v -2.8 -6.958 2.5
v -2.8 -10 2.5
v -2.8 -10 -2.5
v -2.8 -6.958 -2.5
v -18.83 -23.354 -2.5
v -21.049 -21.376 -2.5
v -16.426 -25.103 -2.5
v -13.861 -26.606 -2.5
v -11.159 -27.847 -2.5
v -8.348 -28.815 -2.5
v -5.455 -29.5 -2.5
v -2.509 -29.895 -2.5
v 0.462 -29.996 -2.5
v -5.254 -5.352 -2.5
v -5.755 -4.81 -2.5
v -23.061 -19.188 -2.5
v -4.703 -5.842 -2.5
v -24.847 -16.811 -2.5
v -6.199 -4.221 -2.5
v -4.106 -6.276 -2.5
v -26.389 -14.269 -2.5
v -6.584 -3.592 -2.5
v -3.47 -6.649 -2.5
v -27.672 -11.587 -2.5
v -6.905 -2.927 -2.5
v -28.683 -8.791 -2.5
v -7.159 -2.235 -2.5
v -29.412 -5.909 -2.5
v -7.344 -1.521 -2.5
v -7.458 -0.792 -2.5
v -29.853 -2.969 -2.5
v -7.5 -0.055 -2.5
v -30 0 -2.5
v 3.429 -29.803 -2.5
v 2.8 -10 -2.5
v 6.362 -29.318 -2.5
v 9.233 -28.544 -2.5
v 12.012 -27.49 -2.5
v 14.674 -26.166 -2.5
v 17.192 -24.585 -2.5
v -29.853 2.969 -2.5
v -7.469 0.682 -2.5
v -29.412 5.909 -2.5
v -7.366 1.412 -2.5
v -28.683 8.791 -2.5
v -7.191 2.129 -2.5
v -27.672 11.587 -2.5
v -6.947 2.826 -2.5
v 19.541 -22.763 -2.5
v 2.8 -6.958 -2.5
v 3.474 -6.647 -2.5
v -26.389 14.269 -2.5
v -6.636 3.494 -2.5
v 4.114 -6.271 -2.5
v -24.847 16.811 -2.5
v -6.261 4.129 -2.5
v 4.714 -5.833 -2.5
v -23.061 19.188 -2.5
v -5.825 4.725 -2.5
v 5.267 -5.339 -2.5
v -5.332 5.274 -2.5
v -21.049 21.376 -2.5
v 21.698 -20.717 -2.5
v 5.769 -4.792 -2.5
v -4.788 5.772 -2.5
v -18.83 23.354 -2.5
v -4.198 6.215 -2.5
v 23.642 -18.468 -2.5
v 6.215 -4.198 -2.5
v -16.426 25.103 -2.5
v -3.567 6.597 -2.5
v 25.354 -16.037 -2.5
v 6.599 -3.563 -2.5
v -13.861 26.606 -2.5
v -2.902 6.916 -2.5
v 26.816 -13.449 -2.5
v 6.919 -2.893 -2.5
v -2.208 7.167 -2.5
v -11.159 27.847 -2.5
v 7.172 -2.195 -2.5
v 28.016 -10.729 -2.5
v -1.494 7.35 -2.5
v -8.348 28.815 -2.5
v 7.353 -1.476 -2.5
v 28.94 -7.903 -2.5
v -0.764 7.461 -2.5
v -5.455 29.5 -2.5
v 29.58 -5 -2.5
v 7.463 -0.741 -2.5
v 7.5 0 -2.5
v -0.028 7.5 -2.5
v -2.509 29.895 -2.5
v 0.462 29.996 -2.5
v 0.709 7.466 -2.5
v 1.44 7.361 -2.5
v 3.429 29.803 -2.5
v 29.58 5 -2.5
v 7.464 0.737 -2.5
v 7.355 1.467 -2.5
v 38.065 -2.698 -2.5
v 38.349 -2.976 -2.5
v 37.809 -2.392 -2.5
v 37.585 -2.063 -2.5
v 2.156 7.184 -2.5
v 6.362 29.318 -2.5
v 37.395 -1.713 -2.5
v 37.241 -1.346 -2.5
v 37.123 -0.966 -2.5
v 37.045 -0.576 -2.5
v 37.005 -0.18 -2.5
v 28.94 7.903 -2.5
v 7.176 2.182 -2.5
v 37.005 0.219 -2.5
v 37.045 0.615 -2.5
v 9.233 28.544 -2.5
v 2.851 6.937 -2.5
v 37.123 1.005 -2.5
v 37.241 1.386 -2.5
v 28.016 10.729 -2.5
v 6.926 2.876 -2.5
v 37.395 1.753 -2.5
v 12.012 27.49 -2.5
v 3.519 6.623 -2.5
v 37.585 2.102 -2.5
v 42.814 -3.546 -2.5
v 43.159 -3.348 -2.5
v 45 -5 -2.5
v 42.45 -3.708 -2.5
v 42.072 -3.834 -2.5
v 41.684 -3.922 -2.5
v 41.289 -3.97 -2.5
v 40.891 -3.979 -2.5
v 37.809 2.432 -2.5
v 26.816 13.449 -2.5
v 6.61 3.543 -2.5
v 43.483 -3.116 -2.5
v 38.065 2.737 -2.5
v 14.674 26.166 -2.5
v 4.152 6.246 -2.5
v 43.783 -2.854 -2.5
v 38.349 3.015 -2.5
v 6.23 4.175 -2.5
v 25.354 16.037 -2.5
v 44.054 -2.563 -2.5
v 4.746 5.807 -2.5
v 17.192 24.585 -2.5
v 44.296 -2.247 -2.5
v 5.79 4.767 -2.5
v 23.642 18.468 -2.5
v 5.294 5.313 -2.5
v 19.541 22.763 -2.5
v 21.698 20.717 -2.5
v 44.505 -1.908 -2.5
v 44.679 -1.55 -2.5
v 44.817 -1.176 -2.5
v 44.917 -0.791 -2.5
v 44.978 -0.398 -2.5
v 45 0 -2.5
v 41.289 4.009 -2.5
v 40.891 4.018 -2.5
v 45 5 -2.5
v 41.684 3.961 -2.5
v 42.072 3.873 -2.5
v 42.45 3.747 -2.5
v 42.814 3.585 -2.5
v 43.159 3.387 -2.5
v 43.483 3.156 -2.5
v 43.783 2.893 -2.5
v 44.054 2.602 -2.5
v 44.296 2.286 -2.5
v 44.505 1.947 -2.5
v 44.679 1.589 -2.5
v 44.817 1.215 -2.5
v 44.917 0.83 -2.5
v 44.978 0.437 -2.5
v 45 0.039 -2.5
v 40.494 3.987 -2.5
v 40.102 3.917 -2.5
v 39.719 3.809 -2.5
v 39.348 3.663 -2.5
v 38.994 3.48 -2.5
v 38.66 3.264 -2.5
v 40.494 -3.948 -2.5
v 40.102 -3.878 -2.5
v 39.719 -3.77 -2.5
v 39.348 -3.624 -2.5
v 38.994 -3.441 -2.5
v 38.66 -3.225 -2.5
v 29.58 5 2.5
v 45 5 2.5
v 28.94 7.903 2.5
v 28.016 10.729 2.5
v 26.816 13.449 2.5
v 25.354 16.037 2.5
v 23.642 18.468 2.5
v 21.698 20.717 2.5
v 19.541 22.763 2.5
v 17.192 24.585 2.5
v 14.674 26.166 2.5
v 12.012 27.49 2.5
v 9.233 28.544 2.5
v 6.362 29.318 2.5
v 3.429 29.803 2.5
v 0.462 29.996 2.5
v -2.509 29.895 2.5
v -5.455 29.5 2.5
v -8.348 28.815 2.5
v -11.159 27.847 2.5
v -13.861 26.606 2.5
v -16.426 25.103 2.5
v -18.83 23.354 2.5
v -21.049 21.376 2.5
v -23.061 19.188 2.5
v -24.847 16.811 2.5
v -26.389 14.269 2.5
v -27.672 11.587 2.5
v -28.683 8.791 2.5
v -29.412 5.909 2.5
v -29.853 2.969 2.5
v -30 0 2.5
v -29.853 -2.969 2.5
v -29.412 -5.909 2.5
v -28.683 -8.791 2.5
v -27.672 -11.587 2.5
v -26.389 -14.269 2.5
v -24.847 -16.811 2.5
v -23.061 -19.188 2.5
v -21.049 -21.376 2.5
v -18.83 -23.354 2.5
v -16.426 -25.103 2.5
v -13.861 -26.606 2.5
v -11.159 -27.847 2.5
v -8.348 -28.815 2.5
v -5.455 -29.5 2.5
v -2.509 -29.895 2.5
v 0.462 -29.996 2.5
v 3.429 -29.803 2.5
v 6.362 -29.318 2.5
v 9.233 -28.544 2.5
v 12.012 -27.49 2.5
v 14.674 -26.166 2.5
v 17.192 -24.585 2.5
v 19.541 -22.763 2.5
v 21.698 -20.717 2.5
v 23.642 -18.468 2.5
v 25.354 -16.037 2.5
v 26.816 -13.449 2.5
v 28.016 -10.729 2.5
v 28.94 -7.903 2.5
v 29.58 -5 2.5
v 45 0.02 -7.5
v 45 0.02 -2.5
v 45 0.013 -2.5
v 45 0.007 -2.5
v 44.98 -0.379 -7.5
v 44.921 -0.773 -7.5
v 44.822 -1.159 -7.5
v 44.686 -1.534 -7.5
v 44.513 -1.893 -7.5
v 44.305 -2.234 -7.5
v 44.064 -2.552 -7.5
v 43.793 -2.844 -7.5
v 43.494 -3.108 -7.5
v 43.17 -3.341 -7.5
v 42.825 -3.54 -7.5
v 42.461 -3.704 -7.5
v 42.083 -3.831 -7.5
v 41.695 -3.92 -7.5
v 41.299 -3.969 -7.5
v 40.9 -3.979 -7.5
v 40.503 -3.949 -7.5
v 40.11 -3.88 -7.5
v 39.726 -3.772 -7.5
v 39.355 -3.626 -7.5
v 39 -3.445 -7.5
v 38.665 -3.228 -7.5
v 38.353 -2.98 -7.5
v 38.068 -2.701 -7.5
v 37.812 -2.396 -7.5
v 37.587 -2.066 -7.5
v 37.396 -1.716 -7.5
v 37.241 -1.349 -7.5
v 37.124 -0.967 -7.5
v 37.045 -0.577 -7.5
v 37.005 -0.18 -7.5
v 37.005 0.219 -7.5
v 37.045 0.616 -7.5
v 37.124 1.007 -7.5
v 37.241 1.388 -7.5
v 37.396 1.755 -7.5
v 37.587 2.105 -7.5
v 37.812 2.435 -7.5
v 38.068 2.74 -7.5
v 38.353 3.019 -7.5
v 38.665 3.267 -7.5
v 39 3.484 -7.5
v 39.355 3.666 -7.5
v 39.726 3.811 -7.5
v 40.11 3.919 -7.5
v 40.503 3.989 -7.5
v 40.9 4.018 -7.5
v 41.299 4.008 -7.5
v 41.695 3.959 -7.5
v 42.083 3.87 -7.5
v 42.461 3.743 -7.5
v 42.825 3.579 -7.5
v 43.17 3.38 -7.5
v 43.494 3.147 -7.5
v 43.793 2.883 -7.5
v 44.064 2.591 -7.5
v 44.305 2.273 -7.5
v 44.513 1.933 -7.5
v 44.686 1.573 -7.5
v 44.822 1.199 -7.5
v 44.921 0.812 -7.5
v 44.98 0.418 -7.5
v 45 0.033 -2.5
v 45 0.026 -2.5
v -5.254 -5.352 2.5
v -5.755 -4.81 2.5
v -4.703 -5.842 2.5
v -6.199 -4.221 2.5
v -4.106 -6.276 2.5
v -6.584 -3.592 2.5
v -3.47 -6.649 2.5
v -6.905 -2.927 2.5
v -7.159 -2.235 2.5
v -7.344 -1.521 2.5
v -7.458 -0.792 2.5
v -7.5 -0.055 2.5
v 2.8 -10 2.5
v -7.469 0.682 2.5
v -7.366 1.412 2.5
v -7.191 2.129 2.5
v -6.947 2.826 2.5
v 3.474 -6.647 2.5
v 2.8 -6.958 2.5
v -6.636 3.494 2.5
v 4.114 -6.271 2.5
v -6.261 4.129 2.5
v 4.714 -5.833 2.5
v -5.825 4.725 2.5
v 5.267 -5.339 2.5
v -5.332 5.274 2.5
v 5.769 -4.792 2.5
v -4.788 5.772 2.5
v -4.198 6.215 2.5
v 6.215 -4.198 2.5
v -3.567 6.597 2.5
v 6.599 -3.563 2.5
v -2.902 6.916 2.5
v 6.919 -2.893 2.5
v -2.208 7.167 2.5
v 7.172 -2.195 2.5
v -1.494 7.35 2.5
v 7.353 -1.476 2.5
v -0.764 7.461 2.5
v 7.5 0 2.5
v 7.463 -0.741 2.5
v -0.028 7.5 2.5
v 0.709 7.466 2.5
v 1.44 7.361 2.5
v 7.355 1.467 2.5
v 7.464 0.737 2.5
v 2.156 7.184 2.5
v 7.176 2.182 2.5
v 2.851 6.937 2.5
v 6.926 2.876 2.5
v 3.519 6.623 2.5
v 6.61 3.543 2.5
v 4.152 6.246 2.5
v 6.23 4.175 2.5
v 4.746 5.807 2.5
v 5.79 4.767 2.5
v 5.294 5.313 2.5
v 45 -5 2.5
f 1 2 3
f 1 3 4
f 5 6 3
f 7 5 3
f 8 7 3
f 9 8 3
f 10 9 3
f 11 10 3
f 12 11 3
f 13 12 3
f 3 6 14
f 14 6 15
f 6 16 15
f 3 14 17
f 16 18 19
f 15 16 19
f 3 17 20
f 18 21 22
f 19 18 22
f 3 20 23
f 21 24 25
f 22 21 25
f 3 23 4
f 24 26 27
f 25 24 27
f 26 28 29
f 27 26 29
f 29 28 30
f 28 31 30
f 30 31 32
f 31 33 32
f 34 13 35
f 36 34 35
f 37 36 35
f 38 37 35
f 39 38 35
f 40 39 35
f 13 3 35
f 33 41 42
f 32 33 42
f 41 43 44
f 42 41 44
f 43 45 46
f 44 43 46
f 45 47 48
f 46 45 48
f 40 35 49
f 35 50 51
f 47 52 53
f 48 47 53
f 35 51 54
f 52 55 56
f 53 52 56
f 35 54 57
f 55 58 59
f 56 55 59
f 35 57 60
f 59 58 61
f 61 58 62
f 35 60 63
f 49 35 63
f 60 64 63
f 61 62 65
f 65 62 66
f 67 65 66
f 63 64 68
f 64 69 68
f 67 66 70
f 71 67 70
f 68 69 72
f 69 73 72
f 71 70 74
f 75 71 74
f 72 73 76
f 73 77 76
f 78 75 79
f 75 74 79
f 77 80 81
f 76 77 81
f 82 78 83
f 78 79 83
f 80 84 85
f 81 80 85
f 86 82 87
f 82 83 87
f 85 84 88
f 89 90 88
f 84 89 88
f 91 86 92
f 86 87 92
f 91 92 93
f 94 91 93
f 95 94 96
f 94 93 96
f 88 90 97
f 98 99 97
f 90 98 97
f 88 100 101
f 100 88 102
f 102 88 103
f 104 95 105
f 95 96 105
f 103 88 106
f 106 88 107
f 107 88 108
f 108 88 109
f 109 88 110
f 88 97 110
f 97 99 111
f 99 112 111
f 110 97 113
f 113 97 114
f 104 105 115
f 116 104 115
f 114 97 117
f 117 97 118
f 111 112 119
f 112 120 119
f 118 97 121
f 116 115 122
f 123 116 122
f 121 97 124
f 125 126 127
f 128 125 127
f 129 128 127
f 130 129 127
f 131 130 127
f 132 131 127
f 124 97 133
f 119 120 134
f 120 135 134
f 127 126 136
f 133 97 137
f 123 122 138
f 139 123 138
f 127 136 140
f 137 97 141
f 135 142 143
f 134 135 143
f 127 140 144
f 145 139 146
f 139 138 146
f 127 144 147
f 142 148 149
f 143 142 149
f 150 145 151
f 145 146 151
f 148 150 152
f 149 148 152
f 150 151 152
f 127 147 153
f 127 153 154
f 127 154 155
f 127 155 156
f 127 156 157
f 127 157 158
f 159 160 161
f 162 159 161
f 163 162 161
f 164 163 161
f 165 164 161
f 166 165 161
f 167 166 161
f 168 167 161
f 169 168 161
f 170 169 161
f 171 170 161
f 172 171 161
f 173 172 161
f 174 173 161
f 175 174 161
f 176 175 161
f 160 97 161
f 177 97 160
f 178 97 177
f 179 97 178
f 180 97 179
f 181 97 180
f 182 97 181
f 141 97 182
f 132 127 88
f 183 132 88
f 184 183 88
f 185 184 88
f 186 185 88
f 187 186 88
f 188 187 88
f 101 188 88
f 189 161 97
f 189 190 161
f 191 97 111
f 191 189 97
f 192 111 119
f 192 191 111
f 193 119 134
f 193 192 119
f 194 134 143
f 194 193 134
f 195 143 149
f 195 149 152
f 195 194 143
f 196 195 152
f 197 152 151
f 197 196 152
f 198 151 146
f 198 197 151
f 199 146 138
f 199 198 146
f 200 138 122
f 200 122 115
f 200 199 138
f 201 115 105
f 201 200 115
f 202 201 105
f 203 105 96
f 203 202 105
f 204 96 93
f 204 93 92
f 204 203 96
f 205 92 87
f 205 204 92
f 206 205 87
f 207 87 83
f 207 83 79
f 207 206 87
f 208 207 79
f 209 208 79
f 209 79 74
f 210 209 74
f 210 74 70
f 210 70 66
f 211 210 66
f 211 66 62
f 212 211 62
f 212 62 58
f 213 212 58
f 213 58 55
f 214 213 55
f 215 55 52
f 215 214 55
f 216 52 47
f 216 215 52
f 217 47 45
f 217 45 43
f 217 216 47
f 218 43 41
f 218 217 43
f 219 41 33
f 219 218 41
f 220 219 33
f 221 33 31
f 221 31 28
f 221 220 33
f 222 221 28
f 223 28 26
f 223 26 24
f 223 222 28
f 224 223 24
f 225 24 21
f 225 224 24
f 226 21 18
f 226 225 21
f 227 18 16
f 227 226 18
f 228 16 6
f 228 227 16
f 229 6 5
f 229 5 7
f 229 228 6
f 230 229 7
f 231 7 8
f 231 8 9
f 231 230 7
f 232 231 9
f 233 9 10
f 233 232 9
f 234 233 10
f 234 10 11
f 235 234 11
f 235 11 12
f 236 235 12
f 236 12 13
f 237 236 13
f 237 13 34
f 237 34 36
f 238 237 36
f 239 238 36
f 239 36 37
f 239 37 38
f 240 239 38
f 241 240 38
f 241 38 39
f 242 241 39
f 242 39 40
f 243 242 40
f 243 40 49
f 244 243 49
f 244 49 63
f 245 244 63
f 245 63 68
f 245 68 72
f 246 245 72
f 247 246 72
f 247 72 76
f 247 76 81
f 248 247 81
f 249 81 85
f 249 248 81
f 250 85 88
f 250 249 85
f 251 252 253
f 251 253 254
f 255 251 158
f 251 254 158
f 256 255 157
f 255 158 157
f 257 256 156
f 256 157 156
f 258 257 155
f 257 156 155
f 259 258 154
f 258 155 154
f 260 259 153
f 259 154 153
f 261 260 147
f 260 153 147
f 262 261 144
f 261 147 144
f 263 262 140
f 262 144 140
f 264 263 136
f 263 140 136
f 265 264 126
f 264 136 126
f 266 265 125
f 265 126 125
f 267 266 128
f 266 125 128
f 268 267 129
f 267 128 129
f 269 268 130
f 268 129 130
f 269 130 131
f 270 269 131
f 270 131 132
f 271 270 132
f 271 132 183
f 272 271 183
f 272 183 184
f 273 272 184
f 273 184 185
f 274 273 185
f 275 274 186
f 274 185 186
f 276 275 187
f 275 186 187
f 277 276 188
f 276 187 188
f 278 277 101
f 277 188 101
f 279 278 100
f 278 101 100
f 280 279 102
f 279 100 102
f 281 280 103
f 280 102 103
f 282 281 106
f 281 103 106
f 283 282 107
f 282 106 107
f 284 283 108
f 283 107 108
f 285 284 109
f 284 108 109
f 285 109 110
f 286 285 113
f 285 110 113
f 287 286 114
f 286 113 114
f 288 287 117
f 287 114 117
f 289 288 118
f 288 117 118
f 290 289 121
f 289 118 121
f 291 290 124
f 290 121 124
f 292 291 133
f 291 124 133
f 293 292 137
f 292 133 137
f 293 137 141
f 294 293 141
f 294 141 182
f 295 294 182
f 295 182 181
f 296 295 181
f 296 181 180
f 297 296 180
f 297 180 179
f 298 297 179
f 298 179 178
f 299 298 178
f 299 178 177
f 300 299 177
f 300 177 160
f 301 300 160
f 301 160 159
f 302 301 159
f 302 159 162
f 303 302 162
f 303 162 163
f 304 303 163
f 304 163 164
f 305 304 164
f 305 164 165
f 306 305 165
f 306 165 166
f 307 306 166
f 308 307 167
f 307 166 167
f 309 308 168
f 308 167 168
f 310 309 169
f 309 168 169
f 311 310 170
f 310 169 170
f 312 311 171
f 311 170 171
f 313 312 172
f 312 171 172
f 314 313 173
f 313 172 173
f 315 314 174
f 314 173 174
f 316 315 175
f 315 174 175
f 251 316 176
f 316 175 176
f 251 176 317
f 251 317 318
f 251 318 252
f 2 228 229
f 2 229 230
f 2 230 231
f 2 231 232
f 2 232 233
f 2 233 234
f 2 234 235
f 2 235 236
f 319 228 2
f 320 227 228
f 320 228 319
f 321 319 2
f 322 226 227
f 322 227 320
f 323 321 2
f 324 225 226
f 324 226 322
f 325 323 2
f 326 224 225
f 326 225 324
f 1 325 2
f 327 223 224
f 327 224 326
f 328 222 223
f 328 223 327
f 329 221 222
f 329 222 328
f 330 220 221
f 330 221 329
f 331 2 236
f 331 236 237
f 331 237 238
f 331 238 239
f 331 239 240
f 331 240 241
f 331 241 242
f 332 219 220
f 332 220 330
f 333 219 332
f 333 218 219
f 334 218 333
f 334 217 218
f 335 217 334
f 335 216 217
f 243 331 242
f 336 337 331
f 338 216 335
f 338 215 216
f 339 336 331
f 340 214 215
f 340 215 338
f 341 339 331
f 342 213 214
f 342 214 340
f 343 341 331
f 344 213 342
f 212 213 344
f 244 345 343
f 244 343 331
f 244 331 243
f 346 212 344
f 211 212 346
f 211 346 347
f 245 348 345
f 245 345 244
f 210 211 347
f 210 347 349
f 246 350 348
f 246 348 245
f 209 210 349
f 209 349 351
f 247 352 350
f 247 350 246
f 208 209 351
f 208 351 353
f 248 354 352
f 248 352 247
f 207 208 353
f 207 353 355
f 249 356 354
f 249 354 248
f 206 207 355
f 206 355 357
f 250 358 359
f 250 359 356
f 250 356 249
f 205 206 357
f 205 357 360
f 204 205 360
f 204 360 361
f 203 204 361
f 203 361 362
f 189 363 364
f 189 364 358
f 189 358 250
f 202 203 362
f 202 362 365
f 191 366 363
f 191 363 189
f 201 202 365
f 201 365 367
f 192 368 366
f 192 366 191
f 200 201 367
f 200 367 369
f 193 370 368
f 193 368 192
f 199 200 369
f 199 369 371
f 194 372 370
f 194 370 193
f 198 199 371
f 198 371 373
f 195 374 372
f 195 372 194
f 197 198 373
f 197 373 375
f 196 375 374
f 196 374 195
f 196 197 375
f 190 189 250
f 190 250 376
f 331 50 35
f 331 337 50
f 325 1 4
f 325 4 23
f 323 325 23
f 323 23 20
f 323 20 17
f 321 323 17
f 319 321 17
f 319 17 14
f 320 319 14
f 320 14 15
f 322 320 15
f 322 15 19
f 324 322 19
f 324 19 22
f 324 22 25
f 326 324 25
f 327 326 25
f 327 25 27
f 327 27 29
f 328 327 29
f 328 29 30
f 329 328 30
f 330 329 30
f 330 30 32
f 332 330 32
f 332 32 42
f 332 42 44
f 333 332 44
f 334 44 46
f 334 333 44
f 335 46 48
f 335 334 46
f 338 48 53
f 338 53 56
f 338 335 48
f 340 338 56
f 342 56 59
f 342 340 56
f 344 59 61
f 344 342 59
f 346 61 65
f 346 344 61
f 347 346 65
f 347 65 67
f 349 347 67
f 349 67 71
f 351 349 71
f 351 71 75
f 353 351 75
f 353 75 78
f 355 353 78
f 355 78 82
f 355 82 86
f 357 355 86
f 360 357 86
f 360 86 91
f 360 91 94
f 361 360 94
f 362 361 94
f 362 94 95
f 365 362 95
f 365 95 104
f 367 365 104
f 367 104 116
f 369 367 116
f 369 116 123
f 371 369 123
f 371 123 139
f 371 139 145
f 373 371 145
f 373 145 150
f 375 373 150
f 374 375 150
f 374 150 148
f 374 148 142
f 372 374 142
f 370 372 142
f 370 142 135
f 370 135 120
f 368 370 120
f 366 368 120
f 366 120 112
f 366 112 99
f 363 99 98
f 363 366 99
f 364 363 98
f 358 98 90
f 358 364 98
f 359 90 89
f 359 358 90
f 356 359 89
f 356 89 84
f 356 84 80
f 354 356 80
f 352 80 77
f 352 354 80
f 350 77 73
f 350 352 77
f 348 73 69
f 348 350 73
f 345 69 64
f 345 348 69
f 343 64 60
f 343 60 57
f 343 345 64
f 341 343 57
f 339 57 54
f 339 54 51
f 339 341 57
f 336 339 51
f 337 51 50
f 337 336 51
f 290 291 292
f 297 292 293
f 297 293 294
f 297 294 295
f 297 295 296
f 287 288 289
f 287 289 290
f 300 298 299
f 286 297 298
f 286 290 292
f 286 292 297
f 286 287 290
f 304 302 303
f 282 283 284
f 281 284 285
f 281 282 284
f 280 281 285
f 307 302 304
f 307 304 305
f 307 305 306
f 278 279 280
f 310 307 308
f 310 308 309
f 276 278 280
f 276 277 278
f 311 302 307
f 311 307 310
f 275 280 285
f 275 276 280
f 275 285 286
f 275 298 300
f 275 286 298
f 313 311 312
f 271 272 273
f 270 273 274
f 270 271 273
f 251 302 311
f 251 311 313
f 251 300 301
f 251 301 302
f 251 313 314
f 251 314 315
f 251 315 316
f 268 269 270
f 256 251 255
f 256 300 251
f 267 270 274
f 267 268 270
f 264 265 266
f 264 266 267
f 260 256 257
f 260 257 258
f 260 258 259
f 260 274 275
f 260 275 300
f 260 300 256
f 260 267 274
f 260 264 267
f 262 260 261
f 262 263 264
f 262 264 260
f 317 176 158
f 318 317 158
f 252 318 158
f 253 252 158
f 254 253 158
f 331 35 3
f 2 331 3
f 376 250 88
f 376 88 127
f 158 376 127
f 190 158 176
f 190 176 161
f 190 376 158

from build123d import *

# Parameters (mm, degrees)
F1_DEPTH = 2.5
F2_R     = 4
F3_DEPTH = 5


with BuildPart() as f1:
    # F0 (on Top) → F1 (new body, symmetric)
    with BuildSketch(Plane.XY):
        with BuildLine():
            ThreePointArc((29.5803989155, -5), (29.8949156836, -2.5087878084), (30, 0))
            ThreePointArc((30, 0), (29.8949156836, 2.5087878084), (29.5803989155, 5))
            ThreePointArc((29.5803989155, 5), (-30, 0), (29.5803989155, -5))
        make_face()
        with BuildLine():
            ThreePointArc((-2.8, -6.9577295147), (-4.1982139059, 6.2149014473), (7.5, 0))
            ThreePointArc((7.5, 0), (6.2149014473, -4.1982139059), (2.8, -6.9577295147))
            Line((2.8, -6.9577295147), (2.8, -10))
            Line((2.8, -10), (0, -10))
            Line((0, -10), (-2.8, -10))
            Line((-2.8, -10), (-2.8, -6.9577295147))
        make_face(mode=Mode.SUBTRACT)
        with BuildLine():
            ThreePointArc((29.5803989155, 5), (29.8949156836, 2.5087878084), (30, 0))
            ThreePointArc((30, 0), (29.8949156836, -2.5087878084), (29.5803989155, -5))
            Line((29.5803989155, -5), (45, -5))
            Line((45, -5), (45, 0))
            Line((45, 0), (45, 5))
            Line((45, 5), (29.5803989155, 5))
        make_face()
    extrude(amount=F1_DEPTH, both=True)

    # F2 (on face) → F3 (join)
    with BuildSketch(Plane(origin=(0, 0, -2.5), x_dir=(1, 0, 0), z_dir=(0, 0, -1))):
        with Locations((41.0000477707, -0.0195490011)):
            Circle(F2_R)
    extrude(amount=F3_DEPTH)


solid = f1.part
